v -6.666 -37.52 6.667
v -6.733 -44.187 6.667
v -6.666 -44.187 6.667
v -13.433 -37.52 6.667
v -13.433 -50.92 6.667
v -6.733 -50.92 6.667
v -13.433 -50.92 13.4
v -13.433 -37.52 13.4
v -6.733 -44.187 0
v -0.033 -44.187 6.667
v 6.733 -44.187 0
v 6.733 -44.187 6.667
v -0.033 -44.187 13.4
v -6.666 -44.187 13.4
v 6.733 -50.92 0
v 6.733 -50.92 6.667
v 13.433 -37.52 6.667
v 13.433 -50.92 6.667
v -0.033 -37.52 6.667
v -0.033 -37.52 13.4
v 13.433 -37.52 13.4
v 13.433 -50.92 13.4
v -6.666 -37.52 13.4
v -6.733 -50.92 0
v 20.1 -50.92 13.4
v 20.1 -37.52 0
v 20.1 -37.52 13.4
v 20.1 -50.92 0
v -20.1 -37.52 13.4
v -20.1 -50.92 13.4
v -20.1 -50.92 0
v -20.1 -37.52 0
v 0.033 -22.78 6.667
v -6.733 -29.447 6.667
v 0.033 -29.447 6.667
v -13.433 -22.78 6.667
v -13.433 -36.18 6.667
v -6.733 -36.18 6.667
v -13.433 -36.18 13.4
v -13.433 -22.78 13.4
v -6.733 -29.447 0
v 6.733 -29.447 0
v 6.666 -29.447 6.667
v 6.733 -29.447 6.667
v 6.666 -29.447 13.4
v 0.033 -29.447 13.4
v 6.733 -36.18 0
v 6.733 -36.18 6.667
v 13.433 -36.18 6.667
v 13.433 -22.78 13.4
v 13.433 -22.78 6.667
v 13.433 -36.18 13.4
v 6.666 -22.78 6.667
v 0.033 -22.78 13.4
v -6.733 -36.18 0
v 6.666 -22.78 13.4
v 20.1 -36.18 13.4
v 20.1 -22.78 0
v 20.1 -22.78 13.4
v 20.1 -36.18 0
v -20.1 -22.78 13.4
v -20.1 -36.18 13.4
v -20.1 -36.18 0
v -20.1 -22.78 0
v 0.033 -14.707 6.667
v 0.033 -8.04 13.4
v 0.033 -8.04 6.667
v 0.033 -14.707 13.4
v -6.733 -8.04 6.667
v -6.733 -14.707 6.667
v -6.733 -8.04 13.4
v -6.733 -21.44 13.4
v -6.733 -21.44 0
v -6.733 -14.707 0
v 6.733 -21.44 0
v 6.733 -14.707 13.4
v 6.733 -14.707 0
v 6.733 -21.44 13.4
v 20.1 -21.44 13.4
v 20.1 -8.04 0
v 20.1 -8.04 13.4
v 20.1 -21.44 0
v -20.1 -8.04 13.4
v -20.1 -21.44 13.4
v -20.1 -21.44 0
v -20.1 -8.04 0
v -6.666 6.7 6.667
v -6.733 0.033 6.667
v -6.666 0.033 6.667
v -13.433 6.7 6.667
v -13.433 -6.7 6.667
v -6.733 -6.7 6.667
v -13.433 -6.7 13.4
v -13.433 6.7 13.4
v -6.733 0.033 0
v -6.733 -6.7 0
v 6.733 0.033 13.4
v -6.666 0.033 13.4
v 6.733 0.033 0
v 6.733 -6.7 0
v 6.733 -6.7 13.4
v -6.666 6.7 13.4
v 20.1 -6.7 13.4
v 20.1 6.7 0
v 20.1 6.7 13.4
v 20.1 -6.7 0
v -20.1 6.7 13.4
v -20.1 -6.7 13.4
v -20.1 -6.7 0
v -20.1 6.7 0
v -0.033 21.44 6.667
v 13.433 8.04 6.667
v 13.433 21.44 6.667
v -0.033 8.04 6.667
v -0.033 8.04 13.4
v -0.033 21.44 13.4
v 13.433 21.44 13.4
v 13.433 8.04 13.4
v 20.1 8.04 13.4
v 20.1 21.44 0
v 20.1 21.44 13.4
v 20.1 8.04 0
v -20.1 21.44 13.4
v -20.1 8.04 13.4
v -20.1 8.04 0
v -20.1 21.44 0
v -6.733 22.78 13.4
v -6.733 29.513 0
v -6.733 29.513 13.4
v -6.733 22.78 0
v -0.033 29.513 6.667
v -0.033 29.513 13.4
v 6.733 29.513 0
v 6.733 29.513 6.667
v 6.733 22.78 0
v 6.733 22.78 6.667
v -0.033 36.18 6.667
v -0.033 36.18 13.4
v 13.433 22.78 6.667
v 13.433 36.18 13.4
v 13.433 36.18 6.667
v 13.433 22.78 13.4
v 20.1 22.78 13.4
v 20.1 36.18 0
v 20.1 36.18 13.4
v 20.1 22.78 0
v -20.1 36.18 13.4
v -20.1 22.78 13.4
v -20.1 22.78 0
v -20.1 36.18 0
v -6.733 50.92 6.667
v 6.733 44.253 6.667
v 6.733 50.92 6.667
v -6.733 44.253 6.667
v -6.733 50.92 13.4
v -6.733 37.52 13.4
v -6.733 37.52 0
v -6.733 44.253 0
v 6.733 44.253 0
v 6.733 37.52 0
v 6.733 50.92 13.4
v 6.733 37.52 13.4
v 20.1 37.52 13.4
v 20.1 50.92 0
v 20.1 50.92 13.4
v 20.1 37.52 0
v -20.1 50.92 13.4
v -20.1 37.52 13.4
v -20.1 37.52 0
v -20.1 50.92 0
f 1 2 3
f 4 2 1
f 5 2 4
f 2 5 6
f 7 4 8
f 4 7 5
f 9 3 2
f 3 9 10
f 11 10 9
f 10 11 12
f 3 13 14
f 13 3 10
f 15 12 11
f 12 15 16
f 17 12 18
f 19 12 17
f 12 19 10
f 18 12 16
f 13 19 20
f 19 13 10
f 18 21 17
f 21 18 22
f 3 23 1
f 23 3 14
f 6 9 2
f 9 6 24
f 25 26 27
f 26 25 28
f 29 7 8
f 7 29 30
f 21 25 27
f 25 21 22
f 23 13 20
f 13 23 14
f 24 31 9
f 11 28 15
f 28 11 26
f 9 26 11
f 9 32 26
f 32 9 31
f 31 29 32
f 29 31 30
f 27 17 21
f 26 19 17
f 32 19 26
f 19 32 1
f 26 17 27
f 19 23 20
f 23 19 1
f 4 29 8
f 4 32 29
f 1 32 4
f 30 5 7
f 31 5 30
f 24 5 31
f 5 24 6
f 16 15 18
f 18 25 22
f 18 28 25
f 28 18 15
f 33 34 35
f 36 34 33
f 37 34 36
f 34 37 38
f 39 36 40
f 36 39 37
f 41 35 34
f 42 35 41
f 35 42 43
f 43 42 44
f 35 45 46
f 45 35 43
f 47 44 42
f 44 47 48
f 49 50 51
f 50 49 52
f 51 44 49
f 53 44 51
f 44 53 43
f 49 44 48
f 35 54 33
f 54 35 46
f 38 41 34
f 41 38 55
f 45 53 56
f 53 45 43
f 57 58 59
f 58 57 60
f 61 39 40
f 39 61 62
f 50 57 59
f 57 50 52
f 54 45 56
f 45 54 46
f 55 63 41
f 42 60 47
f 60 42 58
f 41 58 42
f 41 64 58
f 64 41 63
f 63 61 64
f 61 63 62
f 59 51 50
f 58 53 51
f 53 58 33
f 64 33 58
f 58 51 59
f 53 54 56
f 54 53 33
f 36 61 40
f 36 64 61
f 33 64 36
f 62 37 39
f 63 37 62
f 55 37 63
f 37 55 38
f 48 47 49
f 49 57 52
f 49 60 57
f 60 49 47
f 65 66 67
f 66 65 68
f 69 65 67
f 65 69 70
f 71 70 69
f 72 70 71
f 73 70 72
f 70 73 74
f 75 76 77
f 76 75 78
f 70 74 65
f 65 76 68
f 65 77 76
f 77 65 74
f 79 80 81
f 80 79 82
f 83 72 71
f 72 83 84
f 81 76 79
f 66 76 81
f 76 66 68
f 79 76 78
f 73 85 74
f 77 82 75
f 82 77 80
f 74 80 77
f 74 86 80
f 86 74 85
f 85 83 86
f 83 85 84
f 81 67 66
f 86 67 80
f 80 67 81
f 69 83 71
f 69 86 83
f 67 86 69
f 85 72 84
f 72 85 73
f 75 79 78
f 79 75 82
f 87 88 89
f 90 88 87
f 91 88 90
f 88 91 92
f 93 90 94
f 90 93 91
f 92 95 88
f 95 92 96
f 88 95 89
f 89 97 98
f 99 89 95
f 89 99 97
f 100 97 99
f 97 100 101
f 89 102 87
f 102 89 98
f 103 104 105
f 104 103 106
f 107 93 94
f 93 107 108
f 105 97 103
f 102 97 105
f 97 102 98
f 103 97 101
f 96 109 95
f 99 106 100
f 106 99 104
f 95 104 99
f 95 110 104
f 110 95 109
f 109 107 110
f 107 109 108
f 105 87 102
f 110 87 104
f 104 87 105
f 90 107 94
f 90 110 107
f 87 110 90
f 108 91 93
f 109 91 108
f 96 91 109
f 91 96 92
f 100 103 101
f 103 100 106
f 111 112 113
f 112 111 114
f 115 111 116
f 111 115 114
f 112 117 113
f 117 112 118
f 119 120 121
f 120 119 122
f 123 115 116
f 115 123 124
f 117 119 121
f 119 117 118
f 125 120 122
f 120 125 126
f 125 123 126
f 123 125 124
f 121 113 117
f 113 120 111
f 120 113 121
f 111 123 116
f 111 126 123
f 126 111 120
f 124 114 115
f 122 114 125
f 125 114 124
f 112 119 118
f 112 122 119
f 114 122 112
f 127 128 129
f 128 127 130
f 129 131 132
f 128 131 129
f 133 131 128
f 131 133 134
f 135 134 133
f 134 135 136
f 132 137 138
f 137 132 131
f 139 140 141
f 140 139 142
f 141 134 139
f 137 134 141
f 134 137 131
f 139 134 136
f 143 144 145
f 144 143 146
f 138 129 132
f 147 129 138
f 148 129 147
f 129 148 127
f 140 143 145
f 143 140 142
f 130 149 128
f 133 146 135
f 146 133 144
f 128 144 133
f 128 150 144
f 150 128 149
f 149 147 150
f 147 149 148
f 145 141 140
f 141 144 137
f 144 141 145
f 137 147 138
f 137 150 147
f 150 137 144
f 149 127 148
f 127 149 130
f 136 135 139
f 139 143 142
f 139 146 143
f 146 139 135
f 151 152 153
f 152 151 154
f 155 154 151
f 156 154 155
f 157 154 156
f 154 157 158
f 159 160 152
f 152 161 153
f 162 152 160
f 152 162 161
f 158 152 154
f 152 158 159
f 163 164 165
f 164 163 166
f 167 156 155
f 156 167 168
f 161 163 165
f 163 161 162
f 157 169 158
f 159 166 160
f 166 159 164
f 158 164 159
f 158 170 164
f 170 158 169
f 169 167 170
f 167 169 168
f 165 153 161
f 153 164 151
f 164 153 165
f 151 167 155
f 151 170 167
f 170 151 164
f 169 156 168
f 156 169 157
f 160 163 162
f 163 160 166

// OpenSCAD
a=[[-1.5,-0.5,0.5],[-0.5,-0.5,0.5],[0.5,-0.5,0.5],[1.5,-0.5,0.5],
[-1.5,0.5,0.5],[-0.5,0.5,0.5],[0.5,0.5,0.5],[1.5,0.5,0.5],
[-0.5,-0.5,-0.5],[0.5,-0.5,-0.5],
[-0.5,0.5,-0.5],[0.5,0.5,-0.5]];
module burr(x,eps){
difference(){
cube([6,2,2],center=true);
for(i=x){translate(a[i])cube(1+eps,center=true);}
};};
b=[
[0,1,2,3,4,6,7,8,9],
[0,1,2,3,4,5,7,8,9],
[1,2,5,8,9],
[0,1,2,4,8,9],
[2,3,6,7],
[1,2,3,6,7,8,9],
[1,2,5,6,8,9]
];
scale(13.4/2)
for(i=[0:(len(b)-1)]){
translate([0,(-len(b)/2+i+0.5)*2.2,1.0]) burr(b[i],0.01);}
